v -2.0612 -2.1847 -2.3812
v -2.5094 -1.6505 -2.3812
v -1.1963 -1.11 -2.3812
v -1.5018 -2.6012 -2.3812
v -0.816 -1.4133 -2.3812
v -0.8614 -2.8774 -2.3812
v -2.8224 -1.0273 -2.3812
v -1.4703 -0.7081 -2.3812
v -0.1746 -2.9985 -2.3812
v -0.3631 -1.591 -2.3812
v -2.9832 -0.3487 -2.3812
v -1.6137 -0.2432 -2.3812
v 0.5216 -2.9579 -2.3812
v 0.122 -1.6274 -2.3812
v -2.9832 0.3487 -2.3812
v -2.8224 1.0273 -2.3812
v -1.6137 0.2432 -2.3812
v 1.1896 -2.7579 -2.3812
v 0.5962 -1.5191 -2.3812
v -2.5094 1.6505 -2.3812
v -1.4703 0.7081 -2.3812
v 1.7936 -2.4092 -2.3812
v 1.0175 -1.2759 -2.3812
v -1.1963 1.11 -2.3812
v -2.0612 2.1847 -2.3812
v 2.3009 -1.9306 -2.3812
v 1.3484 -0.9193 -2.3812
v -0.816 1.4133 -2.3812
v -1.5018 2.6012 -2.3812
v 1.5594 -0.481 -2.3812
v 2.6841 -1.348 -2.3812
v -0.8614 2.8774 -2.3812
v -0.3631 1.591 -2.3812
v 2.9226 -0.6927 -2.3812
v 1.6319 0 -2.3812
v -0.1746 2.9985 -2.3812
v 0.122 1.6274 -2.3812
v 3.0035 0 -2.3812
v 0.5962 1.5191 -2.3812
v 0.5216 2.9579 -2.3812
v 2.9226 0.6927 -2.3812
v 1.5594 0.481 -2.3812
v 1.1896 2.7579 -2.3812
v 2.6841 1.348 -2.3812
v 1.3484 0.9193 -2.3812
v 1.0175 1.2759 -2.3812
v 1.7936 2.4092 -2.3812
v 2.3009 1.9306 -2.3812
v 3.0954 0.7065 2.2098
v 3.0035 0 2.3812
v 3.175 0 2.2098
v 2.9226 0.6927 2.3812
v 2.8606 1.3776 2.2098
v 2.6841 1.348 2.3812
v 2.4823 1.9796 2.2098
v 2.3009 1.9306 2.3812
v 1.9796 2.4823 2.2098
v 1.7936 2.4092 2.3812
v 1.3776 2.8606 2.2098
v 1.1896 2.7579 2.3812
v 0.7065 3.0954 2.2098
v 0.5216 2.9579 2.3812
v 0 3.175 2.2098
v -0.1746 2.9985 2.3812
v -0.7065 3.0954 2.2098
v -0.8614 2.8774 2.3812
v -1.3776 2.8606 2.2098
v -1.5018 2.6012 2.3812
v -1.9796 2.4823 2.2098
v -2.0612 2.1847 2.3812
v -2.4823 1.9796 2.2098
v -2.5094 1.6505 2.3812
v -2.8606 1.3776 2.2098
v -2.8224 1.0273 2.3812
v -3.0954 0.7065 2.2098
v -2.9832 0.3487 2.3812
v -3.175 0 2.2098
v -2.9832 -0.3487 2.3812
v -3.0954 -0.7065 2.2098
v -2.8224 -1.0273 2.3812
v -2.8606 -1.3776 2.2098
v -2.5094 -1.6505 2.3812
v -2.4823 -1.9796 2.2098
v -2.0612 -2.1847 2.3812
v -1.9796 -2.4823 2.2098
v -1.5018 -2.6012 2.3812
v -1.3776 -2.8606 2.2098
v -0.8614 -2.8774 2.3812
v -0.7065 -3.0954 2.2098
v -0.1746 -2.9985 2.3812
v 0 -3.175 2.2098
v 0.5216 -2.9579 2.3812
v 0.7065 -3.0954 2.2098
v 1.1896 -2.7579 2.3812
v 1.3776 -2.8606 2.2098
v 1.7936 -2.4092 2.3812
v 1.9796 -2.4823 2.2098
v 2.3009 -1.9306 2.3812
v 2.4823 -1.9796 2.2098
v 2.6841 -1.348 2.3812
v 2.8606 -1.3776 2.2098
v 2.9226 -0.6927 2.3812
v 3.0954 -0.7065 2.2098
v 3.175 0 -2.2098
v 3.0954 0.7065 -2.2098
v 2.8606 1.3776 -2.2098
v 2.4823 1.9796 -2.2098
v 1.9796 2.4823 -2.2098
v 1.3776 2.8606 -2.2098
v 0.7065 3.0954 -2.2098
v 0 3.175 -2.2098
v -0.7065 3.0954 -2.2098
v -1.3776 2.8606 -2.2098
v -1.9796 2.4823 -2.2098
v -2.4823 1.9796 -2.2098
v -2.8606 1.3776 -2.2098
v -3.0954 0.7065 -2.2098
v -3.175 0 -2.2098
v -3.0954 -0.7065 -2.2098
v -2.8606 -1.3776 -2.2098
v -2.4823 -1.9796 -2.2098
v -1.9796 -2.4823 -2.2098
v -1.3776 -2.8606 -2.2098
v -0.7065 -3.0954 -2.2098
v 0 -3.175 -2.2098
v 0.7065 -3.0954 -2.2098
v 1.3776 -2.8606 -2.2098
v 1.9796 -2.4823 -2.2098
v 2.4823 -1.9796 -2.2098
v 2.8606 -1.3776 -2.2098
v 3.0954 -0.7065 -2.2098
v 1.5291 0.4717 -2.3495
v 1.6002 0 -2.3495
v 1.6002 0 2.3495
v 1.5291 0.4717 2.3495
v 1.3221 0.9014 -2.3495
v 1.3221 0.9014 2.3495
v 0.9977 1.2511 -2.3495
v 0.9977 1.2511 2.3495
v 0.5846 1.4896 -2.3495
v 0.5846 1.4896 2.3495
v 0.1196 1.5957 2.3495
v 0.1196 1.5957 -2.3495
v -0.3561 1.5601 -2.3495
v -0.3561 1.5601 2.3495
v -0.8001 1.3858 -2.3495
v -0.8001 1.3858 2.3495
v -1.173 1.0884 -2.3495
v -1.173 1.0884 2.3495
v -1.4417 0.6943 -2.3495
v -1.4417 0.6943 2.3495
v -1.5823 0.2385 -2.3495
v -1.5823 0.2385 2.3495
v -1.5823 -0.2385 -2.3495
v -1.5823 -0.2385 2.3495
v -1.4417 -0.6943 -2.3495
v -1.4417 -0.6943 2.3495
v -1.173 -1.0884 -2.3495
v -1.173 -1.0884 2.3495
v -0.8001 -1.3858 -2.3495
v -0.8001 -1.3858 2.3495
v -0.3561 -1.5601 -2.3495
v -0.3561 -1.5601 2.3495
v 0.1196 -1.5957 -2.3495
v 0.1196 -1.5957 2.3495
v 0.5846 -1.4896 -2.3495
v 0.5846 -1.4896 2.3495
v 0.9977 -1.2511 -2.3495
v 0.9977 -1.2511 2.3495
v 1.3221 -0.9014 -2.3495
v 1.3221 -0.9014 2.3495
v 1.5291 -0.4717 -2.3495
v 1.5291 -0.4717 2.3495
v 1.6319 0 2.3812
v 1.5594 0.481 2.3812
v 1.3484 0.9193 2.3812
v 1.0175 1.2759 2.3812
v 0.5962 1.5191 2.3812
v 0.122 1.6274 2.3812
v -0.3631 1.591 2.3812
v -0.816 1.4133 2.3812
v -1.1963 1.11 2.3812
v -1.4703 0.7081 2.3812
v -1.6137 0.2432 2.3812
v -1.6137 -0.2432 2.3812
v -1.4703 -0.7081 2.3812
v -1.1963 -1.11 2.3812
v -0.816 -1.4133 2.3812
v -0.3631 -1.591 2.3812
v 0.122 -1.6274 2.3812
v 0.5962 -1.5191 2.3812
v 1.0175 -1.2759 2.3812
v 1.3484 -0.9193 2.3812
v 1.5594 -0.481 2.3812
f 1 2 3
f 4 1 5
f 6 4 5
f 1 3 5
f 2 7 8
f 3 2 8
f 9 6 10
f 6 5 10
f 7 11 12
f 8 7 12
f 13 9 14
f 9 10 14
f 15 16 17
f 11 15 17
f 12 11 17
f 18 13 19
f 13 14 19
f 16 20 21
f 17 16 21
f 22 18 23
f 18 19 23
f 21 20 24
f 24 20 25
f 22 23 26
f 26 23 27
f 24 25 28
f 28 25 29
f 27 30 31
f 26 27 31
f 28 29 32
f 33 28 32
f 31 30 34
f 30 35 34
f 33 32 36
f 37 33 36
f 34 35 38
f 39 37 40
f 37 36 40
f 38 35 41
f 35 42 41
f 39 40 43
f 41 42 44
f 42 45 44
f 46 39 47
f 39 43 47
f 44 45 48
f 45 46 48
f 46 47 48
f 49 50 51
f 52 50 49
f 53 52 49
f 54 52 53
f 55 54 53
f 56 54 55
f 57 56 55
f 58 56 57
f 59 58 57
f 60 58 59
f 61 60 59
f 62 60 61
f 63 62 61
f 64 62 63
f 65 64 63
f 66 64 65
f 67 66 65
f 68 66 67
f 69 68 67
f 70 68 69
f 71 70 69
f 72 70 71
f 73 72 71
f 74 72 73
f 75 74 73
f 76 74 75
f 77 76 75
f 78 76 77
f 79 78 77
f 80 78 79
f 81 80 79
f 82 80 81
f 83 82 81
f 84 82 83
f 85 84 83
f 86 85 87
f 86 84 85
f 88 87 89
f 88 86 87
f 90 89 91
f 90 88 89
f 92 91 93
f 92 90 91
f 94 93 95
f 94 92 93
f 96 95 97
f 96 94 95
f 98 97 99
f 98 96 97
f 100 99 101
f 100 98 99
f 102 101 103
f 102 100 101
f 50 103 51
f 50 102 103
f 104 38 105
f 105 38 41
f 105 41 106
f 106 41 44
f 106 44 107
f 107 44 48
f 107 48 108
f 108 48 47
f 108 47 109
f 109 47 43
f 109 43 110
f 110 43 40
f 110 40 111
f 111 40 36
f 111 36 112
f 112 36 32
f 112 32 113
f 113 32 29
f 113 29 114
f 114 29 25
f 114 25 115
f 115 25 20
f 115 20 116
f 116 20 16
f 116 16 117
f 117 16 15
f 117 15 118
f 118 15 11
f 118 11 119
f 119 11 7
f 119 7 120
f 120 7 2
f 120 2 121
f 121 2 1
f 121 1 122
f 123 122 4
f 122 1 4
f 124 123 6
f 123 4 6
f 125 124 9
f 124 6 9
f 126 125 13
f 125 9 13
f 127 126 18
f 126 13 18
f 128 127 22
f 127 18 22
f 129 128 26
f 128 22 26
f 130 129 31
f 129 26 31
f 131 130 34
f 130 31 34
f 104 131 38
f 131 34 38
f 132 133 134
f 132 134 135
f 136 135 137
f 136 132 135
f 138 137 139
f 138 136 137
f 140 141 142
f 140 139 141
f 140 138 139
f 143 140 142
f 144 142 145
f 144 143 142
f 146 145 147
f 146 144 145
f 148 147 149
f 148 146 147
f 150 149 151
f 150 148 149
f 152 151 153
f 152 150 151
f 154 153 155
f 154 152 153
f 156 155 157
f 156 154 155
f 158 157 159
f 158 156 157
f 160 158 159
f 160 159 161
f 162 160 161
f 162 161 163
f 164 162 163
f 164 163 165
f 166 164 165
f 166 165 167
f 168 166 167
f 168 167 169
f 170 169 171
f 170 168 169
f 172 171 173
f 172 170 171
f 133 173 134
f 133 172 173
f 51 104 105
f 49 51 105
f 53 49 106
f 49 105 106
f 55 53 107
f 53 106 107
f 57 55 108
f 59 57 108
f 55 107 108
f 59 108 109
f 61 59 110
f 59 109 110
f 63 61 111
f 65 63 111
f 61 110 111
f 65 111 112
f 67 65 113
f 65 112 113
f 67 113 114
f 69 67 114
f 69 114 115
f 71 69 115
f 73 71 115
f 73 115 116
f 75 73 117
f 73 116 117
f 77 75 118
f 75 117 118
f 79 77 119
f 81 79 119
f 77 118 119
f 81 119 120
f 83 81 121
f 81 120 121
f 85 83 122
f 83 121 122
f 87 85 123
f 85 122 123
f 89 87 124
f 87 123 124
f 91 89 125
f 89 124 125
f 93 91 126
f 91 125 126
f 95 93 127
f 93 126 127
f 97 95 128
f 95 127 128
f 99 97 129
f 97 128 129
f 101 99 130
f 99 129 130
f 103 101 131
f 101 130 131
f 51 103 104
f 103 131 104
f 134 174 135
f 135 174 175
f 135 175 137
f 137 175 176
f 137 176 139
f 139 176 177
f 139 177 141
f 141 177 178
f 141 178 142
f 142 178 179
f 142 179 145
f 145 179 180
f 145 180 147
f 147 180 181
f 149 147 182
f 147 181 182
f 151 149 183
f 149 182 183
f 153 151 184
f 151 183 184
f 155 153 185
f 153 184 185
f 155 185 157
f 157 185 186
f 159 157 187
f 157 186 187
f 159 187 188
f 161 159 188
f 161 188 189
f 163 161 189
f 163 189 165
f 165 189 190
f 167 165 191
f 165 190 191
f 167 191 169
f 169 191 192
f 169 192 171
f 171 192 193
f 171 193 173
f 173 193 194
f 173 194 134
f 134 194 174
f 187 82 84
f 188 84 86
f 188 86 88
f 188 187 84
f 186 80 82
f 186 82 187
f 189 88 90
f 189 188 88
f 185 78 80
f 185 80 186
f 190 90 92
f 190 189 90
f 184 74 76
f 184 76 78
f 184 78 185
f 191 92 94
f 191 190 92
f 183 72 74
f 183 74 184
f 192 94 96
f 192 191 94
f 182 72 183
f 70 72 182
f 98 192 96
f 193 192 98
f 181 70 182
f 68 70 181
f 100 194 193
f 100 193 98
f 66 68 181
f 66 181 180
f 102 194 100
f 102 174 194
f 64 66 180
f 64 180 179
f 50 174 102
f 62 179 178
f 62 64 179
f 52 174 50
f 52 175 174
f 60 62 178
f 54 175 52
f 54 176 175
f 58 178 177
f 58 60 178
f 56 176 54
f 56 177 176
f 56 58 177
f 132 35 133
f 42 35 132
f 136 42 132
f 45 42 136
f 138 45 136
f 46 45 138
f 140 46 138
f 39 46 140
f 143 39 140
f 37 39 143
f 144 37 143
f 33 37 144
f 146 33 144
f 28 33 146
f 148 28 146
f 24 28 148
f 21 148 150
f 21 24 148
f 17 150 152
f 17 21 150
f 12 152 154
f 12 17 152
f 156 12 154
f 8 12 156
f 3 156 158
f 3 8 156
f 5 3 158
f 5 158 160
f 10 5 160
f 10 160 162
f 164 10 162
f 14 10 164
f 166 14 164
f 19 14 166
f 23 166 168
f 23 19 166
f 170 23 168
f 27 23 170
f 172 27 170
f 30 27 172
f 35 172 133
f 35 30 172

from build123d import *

# Parameters (mm, degrees)
BOSS_EXTRUDE1_DEPTH      = 2.38125
BOSS_EXTRUDE1_DEPTH_BACK = 2.38125
SKETCH3_R                = 3.175
SKETCH3_R_2              = 1.4605
CHAMFER1_SIZE            = 0.17145
CUT_EXTRUDE1_DEPTH       = 6.082479863
CUT_EXTRUDE1_DEPTH_BACK  = 6.082479863
SKETCH4_R                = 1.6002


with BuildPart() as part:
    # Sketch3 → Boss-Extrude1 (new, two sides: drawn at the far end of the back side and taken through both)
    with BuildSketch(Plane.XY.offset(-BOSS_EXTRUDE1_DEPTH_BACK)):
        Circle(SKETCH3_R)
        Circle(SKETCH3_R_2, mode=Mode.SUBTRACT)
    extrude(amount=BOSS_EXTRUDE1_DEPTH + BOSS_EXTRUDE1_DEPTH_BACK)

    # Chamfer1
    chamfer1_edges = [part.edges().sort_by_distance(p)[0] for p in [
        (-3.175, 0, -2.38125),
        (-1.4605, 0, -2.38125),
        (-3.175, 0, 2.38125),
        (-1.4605, 0, 2.38125),
    ]]
    chamfer(chamfer1_edges, length=CHAMFER1_SIZE)

    # Sketch4 → Cut-Extrude1 (cut, two sides: drawn at the far end of the back side and taken through both)
    with BuildSketch(Plane.XY.offset(-CUT_EXTRUDE1_DEPTH_BACK)):
        Circle(SKETCH4_R)
    extrude(amount=CUT_EXTRUDE1_DEPTH + CUT_EXTRUDE1_DEPTH_BACK, mode=Mode.SUBTRACT)


solid = part.part
